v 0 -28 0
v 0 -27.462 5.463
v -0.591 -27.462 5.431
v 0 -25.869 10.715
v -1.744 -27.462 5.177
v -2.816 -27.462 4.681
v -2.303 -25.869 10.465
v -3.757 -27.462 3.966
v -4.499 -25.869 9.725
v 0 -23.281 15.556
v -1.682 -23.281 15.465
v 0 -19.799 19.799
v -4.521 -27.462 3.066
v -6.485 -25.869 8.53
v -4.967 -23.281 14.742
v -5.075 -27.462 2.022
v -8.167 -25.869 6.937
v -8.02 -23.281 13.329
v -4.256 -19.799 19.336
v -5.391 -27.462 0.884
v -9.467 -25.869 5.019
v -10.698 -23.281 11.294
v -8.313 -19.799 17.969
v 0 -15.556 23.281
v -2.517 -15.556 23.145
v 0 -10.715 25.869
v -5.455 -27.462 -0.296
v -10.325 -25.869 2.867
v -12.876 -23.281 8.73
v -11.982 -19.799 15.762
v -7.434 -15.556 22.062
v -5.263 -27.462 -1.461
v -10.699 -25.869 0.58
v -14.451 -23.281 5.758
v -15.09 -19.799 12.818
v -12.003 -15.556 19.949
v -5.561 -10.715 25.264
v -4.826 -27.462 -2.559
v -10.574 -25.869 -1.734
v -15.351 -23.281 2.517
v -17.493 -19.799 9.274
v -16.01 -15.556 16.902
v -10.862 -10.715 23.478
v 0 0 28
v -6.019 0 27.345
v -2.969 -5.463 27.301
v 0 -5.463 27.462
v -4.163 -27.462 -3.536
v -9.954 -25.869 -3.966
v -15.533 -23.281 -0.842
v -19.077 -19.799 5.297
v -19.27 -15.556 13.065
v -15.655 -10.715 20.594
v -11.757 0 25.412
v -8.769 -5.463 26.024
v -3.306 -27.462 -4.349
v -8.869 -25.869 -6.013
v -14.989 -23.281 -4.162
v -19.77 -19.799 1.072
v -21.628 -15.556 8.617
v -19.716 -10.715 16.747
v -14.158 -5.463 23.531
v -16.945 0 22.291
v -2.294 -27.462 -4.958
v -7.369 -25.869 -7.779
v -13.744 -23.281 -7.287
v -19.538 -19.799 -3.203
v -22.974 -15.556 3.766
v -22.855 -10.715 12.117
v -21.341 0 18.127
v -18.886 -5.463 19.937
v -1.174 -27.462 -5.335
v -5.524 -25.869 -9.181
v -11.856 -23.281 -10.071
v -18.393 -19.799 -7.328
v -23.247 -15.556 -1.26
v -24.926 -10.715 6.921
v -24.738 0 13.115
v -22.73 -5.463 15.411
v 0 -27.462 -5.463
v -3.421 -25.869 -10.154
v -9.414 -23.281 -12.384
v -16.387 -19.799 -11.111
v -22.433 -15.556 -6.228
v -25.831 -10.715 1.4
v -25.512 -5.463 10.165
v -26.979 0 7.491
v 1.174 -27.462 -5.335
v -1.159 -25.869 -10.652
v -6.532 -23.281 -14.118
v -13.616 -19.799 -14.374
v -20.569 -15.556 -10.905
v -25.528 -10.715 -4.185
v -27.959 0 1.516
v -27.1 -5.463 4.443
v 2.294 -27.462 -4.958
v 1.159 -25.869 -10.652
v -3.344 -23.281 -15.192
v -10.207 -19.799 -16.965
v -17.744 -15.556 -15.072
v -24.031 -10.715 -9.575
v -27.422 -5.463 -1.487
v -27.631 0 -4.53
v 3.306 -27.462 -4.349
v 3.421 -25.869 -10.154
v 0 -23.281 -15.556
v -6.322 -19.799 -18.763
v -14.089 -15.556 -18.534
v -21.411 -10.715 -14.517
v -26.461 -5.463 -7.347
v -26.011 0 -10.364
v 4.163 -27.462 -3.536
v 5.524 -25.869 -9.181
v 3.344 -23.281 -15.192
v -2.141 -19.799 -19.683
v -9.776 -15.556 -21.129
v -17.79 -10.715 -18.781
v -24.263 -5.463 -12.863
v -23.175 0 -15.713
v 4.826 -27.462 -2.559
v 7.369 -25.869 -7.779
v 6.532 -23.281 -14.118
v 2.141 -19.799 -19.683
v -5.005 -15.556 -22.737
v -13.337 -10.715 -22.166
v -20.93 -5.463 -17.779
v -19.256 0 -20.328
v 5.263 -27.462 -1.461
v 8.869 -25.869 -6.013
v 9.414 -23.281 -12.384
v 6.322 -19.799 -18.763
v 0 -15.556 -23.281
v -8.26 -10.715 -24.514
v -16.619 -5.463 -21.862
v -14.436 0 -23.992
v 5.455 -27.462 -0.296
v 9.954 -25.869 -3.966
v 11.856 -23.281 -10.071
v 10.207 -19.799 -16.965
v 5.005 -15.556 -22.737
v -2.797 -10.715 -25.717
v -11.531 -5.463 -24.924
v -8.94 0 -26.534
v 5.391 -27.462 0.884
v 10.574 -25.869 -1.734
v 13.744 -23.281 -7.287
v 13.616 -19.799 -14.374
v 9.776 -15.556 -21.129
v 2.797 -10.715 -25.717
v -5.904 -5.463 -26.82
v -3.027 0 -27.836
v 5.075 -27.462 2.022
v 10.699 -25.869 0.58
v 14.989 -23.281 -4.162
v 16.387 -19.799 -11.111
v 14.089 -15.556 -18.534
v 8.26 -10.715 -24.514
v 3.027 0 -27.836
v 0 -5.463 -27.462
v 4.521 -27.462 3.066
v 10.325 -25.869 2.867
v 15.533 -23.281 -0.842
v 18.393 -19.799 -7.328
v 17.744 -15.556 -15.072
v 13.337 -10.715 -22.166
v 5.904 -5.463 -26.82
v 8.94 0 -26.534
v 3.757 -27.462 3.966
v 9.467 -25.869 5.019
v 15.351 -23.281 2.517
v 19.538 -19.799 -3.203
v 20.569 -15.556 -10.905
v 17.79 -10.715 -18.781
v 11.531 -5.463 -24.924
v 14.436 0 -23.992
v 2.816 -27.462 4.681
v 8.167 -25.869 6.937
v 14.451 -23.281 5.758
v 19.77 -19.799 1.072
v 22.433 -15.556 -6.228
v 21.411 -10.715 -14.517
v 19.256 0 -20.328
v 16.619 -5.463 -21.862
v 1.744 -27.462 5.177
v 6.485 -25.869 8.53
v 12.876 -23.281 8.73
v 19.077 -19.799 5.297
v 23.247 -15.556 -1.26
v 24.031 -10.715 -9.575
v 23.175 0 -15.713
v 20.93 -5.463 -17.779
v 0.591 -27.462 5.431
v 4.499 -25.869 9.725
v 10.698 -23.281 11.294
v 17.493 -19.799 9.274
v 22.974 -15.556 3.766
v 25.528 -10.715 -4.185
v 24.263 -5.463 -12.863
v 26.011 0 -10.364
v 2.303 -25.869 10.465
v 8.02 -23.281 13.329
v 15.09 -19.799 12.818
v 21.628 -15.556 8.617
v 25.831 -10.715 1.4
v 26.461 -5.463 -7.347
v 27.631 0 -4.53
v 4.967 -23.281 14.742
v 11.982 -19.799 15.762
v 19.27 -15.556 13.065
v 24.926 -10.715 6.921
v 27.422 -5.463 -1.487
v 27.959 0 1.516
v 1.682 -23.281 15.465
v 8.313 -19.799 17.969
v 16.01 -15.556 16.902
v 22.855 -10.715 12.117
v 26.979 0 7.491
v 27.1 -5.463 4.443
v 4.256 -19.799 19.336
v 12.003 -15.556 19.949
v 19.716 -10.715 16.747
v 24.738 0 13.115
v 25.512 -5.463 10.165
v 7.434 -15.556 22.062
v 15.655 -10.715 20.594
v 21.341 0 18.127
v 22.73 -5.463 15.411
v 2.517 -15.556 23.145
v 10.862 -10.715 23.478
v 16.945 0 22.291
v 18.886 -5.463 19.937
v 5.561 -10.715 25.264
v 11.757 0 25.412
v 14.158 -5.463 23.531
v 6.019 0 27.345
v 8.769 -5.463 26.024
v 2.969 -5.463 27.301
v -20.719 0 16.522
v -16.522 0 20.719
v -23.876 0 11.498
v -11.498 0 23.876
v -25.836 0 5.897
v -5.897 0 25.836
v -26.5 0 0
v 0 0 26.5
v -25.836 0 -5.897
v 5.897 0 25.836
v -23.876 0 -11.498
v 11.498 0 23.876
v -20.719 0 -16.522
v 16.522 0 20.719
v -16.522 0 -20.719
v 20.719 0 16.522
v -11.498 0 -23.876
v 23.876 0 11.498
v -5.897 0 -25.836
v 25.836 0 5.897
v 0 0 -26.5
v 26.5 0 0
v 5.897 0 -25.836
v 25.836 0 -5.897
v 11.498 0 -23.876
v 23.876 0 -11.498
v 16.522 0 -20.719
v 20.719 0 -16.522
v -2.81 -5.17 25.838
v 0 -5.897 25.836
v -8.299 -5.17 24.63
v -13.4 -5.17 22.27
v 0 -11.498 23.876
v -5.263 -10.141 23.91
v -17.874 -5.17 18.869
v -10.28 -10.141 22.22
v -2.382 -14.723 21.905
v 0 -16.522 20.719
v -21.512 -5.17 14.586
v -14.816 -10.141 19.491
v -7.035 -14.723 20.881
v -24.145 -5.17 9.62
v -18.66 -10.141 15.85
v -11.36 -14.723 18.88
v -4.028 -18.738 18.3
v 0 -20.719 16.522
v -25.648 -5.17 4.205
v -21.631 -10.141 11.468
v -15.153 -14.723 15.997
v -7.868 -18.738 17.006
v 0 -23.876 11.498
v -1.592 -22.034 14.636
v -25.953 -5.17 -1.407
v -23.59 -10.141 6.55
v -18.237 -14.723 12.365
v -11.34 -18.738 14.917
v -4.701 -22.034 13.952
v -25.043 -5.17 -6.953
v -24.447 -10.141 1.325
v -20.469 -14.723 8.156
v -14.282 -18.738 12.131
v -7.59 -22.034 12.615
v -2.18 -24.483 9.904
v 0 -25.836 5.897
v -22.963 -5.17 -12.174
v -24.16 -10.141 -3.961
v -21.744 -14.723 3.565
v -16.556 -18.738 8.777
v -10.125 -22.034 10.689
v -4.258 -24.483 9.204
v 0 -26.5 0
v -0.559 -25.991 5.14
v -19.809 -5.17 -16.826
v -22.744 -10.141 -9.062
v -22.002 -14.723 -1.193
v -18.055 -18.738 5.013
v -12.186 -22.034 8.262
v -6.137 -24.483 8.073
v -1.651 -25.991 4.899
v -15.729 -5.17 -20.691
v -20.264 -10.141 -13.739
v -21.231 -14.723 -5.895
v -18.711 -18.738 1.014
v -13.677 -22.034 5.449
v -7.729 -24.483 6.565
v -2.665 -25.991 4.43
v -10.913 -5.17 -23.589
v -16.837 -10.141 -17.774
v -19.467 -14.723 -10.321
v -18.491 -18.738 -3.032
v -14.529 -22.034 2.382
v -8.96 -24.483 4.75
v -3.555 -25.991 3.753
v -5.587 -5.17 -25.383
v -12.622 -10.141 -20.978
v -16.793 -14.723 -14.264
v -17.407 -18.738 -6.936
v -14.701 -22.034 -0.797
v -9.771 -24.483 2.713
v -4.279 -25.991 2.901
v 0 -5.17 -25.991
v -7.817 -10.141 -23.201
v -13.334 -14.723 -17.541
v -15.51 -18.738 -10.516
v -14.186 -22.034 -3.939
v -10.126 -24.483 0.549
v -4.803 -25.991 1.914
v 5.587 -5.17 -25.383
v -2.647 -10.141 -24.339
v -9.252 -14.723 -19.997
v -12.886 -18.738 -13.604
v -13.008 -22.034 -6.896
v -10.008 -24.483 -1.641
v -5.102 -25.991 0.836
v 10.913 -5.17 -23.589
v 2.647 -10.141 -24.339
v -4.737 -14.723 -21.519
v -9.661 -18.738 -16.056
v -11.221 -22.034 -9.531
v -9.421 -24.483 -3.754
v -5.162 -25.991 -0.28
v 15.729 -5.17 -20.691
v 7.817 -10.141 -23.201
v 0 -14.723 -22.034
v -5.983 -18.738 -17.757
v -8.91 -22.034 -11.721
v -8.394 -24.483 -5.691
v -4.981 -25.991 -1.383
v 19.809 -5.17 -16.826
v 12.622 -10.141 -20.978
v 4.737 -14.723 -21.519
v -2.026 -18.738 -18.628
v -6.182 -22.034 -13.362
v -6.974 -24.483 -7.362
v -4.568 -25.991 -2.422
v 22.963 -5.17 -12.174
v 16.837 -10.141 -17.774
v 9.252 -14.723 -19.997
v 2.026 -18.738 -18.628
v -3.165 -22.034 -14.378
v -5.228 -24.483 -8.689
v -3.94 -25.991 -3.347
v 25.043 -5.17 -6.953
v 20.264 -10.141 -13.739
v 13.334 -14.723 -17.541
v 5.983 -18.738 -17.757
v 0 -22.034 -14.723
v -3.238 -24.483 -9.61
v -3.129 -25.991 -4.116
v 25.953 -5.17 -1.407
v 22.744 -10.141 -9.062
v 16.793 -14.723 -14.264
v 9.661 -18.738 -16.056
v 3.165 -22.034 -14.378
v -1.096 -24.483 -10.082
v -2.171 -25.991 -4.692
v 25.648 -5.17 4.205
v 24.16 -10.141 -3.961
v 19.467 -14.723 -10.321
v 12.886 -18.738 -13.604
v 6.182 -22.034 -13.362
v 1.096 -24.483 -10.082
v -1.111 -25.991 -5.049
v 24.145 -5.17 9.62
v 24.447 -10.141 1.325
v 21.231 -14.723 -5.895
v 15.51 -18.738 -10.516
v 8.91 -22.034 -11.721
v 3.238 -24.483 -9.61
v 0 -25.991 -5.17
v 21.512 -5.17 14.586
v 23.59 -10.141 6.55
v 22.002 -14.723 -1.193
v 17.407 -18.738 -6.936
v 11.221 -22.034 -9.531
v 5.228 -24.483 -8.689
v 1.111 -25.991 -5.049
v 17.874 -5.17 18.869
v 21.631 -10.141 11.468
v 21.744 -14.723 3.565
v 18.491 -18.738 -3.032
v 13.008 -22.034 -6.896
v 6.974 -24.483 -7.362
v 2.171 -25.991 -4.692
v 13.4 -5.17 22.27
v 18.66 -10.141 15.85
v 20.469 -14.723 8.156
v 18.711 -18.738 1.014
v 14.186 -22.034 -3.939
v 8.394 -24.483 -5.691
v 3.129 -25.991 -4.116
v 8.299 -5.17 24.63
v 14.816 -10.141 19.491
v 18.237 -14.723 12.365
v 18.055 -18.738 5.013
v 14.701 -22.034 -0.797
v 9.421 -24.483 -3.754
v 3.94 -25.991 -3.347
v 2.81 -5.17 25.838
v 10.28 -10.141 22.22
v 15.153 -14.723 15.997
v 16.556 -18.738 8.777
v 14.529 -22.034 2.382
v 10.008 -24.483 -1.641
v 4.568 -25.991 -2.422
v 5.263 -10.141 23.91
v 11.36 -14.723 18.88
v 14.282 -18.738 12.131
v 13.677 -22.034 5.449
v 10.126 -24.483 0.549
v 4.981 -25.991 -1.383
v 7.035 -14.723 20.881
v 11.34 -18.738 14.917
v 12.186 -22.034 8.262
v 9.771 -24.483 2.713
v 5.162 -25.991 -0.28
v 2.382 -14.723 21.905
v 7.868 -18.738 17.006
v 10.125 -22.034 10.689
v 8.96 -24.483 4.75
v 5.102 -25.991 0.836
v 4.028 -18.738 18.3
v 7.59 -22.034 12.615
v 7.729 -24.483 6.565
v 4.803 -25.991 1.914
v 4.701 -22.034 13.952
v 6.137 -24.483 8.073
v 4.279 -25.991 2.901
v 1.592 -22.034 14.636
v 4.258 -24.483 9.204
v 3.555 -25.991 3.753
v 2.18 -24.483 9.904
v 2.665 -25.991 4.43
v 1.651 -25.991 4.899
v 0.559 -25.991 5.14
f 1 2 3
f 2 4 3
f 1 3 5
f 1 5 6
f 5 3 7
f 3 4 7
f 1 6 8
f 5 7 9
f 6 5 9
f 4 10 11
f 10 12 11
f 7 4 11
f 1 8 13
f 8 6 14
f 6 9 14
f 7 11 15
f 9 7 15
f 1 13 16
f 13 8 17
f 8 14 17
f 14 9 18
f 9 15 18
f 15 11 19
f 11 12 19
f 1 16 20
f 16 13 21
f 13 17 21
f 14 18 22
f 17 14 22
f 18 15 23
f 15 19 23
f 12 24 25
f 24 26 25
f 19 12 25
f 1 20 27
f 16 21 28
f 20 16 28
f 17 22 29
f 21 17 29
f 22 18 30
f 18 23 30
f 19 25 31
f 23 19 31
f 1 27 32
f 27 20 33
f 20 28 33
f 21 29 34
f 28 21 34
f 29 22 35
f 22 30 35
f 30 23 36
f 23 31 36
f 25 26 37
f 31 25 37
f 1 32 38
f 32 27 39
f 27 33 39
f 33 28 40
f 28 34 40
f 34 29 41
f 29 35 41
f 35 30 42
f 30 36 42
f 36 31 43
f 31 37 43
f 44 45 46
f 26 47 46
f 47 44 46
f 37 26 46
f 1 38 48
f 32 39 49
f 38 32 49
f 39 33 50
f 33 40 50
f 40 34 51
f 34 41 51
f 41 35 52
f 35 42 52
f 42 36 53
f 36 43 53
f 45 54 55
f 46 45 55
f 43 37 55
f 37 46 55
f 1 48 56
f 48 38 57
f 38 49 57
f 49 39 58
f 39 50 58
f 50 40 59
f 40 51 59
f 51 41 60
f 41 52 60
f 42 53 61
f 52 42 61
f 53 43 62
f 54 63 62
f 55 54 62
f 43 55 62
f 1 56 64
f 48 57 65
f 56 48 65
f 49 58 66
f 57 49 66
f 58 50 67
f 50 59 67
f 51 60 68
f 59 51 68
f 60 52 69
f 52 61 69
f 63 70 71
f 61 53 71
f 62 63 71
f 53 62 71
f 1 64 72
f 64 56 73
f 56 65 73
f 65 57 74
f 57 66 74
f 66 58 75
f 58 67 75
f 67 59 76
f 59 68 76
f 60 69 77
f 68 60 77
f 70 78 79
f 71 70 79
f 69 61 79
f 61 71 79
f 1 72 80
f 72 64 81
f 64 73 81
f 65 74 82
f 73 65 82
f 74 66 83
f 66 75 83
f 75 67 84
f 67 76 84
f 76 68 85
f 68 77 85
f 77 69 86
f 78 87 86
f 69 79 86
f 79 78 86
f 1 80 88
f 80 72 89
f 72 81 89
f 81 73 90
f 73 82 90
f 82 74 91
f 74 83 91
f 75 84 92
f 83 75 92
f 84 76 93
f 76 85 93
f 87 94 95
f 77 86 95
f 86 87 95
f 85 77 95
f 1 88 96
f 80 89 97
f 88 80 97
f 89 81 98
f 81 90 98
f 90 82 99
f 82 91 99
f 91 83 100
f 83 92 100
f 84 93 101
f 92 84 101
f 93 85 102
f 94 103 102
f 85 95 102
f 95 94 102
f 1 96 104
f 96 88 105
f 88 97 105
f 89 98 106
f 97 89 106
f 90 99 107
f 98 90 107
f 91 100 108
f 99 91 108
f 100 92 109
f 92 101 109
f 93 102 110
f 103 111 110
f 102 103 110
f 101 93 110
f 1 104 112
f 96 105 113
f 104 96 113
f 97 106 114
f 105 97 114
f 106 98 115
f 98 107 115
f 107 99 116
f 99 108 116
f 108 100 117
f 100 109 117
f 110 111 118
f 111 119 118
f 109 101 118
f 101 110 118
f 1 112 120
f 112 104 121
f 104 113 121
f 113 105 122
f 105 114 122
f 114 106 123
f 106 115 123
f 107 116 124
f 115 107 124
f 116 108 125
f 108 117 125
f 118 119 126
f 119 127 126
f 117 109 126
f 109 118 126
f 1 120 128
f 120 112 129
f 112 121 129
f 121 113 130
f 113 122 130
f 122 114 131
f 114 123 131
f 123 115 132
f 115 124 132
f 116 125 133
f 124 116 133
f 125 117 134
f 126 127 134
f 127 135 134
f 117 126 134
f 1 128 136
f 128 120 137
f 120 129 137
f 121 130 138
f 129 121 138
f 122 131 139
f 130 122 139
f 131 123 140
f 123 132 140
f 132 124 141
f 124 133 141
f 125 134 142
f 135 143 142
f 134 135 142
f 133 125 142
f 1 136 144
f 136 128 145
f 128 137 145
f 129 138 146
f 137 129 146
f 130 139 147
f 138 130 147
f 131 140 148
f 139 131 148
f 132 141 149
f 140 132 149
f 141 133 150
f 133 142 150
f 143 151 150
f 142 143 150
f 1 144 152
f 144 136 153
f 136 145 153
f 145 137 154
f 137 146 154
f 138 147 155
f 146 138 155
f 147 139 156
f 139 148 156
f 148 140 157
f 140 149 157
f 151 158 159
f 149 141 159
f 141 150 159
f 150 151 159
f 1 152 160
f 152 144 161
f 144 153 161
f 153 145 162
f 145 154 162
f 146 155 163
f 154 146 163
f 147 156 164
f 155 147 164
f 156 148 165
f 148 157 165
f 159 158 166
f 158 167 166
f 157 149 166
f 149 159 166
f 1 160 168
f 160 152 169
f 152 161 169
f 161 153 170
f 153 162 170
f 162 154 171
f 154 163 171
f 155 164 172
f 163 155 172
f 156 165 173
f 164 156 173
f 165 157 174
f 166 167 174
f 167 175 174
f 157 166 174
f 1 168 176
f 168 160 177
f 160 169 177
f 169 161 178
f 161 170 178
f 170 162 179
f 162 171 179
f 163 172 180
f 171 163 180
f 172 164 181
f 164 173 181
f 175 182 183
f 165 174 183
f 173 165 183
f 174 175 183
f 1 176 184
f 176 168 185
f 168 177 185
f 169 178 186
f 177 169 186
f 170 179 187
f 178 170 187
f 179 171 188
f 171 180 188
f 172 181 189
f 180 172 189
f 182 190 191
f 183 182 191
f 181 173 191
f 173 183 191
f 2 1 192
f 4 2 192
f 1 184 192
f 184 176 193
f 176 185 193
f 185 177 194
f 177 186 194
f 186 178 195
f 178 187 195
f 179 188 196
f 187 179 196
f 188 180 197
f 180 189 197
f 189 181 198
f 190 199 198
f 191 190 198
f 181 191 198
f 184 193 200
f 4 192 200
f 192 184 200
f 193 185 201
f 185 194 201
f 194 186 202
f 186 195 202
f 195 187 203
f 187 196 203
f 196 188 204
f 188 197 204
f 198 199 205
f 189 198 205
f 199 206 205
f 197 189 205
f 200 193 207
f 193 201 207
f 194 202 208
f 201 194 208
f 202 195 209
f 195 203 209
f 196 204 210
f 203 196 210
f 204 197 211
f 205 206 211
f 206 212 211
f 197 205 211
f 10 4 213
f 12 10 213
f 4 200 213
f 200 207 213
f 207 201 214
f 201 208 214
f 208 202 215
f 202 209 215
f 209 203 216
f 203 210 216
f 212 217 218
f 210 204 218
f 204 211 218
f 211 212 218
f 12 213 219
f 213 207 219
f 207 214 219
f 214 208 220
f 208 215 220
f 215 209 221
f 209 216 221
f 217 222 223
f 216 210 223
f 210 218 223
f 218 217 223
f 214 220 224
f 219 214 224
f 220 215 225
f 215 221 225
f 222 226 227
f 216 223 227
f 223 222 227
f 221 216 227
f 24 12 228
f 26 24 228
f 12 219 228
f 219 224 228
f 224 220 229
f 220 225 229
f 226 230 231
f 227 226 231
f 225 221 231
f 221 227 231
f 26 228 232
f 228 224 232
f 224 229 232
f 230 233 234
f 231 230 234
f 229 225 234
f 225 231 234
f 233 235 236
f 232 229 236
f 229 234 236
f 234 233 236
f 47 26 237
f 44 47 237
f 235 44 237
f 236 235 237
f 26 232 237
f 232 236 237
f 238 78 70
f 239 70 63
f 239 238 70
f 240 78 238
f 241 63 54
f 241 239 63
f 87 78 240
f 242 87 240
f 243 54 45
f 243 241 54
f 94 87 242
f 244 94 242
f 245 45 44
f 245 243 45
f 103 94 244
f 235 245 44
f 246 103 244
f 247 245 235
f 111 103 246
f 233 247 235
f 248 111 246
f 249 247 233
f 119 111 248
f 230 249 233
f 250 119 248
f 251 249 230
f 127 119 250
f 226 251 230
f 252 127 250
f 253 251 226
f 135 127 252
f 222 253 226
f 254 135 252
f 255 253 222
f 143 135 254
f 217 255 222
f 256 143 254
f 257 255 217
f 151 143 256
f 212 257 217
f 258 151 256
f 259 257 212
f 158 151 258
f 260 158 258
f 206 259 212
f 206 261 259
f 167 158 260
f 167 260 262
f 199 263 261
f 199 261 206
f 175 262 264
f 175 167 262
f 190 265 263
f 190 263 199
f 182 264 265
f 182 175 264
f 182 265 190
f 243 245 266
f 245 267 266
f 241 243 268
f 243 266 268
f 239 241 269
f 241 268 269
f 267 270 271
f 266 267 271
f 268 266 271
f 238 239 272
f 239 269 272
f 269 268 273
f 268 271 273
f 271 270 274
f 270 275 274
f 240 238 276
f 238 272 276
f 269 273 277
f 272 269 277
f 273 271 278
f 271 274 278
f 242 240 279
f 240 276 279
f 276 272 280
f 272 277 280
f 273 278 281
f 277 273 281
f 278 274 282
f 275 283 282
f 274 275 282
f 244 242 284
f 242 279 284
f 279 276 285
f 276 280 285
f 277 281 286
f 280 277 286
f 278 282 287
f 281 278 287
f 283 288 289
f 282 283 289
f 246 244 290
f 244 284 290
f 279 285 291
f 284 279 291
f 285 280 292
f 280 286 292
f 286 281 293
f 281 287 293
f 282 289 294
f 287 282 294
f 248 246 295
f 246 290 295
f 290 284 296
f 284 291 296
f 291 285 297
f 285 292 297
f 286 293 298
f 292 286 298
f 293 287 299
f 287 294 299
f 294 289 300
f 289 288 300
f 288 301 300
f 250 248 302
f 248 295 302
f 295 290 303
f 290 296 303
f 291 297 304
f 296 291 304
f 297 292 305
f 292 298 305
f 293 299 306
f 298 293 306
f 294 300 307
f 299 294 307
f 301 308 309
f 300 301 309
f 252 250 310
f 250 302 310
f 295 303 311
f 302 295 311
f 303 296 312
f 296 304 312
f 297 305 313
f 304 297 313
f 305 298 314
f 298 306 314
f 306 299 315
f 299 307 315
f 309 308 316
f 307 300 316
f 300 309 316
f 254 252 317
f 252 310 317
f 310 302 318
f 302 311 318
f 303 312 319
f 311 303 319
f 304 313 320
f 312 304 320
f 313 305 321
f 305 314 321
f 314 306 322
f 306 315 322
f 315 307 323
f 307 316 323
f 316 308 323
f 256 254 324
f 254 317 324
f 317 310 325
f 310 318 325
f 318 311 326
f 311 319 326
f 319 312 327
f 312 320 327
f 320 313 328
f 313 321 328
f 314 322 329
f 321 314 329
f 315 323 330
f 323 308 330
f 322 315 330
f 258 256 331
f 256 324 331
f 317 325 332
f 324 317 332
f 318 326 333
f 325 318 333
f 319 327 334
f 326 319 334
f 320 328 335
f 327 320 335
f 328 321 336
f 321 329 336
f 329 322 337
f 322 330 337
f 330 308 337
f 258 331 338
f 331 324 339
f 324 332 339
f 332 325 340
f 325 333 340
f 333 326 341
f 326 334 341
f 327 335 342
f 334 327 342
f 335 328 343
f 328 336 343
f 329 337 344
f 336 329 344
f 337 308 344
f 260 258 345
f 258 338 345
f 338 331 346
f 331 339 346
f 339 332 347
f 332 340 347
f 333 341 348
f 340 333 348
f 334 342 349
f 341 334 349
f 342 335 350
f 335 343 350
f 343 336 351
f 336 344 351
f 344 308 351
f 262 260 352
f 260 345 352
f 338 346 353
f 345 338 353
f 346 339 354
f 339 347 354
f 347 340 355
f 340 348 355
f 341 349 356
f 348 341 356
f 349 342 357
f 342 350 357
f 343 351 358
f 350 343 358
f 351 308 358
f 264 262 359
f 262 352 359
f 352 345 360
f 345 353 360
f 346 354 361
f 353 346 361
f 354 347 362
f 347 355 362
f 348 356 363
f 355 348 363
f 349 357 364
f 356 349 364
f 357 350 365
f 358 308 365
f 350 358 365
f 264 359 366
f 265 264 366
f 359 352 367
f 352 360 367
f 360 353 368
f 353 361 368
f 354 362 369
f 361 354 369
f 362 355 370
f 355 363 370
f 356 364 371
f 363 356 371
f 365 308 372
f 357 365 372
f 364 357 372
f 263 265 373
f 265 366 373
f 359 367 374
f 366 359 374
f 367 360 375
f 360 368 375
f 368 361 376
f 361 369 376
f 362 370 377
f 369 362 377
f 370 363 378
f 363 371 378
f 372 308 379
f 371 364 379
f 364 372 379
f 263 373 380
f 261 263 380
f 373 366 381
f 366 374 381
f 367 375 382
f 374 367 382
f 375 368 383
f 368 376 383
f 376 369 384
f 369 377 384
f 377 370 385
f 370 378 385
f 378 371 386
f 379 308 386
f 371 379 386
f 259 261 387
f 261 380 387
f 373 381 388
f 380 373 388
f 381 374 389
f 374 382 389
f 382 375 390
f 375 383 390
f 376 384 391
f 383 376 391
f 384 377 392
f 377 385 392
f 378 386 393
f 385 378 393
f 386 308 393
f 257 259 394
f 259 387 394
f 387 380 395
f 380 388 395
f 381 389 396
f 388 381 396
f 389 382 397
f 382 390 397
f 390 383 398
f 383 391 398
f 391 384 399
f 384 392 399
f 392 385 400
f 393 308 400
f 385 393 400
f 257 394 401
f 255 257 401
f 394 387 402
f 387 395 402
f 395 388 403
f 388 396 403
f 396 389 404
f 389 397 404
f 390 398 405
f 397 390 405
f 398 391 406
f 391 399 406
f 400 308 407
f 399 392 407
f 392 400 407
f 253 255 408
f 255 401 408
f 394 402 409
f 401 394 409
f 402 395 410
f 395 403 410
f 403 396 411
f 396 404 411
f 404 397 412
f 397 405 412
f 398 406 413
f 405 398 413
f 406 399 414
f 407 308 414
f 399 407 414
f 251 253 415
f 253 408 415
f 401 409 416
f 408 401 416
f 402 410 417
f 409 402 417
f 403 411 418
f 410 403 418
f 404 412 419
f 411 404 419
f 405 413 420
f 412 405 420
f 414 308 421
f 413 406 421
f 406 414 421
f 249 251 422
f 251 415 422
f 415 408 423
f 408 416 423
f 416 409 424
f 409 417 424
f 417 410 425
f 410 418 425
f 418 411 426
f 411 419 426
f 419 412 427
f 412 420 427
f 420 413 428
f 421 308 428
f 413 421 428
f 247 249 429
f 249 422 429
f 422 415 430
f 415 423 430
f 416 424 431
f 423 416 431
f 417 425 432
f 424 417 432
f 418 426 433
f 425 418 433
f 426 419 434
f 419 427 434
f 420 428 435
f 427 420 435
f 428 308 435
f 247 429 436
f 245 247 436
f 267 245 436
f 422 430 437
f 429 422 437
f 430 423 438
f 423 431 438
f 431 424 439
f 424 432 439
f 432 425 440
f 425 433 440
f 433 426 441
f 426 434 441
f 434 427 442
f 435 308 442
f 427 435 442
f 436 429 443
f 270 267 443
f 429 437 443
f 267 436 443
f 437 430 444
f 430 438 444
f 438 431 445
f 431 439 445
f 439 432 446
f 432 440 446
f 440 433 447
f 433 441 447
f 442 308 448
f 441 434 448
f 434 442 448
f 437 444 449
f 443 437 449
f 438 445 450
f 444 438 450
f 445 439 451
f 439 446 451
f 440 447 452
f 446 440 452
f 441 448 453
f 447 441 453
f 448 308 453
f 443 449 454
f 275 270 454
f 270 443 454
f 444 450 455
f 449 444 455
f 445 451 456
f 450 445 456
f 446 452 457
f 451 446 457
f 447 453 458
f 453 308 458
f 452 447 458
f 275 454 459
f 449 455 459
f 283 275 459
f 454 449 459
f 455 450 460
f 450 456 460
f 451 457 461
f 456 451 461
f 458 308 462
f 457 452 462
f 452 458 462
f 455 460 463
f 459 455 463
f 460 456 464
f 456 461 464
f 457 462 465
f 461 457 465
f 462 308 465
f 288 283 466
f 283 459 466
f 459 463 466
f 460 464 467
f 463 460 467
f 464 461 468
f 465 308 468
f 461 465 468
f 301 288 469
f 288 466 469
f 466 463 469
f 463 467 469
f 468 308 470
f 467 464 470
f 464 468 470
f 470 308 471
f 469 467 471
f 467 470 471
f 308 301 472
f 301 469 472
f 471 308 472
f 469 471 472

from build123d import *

# Parameters (mm, degrees)
CROQUIS2_W            = 10
CROQUIS2_H            = 14
REDONDEO1_R           = 1
CROQUIS3_R            = 29.845650159
CORTAR_EXTRUIR1_DEPTH = 30


with BuildPart() as part:
    # Croquis1 → Revolución3 (revolve)
    with BuildSketch(Plane(origin=(0, 0, 0), x_dir=(0, 0, -1), z_dir=(1, 0, 0))):
        with BuildLine():
            Line((-0.5, 27.995535358), (-0.5, 26.495282599))
            Line((-0.5, 26.495282599), (-0.5, 24.9949995))
            ThreePointArc((-0.5, 24.9949995), (-10.791516482, 22.5509018), (-19.151111078, 16.069690242))
            Line((-19.151111078, 16.069690242), (-20.300177743, 17.033871657))
            ThreePointArc((-20.300177743, 17.033871657), (-24.017156356, -11.199383936), (0, -26.5))
            Line((0, -26.5), (0, -28))
            ThreePointArc((0, -28), (-27.998883817, -0.250009966), (-0.5, 27.995535358))
        make_face()
    revolve(axis=Axis((0, 29, 0), (0, -1, 0)))

    # Croquis2 → Cortar-Revolución2 (revolve, cut)
    with BuildSketch(Plane(origin=(0, 0, 0), x_dir=(0, 0, -1), z_dir=(1, 0, 0))):
        with Locations((-5, 23)):
            Rectangle(CROQUIS2_W, CROQUIS2_H)
    revolve(axis=Axis((0, 0, 0), (0, 1, 0)), mode=Mode.SUBTRACT)

    # Redondeo1
    redondeo1_edges = [part.edges().sort_by_distance(p)[0] for p in [
        (0, 22.912878475, -10),
        (0, 26.153393661, -10),
        (0, 16.069690242, -19.151111078),
    ]]
    fillet(redondeo1_edges, radius=REDONDEO1_R)

    # Croquis3 → Cortar-Extruir1 (cut)
    with BuildSketch(Plane(origin=(0, 0, 0), x_dir=(1, 0, 0), z_dir=(0, 1, 0))):
        Circle(CROQUIS3_R)
    extrude(amount=CORTAR_EXTRUIR1_DEPTH, mode=Mode.SUBTRACT)


solid = part.part
